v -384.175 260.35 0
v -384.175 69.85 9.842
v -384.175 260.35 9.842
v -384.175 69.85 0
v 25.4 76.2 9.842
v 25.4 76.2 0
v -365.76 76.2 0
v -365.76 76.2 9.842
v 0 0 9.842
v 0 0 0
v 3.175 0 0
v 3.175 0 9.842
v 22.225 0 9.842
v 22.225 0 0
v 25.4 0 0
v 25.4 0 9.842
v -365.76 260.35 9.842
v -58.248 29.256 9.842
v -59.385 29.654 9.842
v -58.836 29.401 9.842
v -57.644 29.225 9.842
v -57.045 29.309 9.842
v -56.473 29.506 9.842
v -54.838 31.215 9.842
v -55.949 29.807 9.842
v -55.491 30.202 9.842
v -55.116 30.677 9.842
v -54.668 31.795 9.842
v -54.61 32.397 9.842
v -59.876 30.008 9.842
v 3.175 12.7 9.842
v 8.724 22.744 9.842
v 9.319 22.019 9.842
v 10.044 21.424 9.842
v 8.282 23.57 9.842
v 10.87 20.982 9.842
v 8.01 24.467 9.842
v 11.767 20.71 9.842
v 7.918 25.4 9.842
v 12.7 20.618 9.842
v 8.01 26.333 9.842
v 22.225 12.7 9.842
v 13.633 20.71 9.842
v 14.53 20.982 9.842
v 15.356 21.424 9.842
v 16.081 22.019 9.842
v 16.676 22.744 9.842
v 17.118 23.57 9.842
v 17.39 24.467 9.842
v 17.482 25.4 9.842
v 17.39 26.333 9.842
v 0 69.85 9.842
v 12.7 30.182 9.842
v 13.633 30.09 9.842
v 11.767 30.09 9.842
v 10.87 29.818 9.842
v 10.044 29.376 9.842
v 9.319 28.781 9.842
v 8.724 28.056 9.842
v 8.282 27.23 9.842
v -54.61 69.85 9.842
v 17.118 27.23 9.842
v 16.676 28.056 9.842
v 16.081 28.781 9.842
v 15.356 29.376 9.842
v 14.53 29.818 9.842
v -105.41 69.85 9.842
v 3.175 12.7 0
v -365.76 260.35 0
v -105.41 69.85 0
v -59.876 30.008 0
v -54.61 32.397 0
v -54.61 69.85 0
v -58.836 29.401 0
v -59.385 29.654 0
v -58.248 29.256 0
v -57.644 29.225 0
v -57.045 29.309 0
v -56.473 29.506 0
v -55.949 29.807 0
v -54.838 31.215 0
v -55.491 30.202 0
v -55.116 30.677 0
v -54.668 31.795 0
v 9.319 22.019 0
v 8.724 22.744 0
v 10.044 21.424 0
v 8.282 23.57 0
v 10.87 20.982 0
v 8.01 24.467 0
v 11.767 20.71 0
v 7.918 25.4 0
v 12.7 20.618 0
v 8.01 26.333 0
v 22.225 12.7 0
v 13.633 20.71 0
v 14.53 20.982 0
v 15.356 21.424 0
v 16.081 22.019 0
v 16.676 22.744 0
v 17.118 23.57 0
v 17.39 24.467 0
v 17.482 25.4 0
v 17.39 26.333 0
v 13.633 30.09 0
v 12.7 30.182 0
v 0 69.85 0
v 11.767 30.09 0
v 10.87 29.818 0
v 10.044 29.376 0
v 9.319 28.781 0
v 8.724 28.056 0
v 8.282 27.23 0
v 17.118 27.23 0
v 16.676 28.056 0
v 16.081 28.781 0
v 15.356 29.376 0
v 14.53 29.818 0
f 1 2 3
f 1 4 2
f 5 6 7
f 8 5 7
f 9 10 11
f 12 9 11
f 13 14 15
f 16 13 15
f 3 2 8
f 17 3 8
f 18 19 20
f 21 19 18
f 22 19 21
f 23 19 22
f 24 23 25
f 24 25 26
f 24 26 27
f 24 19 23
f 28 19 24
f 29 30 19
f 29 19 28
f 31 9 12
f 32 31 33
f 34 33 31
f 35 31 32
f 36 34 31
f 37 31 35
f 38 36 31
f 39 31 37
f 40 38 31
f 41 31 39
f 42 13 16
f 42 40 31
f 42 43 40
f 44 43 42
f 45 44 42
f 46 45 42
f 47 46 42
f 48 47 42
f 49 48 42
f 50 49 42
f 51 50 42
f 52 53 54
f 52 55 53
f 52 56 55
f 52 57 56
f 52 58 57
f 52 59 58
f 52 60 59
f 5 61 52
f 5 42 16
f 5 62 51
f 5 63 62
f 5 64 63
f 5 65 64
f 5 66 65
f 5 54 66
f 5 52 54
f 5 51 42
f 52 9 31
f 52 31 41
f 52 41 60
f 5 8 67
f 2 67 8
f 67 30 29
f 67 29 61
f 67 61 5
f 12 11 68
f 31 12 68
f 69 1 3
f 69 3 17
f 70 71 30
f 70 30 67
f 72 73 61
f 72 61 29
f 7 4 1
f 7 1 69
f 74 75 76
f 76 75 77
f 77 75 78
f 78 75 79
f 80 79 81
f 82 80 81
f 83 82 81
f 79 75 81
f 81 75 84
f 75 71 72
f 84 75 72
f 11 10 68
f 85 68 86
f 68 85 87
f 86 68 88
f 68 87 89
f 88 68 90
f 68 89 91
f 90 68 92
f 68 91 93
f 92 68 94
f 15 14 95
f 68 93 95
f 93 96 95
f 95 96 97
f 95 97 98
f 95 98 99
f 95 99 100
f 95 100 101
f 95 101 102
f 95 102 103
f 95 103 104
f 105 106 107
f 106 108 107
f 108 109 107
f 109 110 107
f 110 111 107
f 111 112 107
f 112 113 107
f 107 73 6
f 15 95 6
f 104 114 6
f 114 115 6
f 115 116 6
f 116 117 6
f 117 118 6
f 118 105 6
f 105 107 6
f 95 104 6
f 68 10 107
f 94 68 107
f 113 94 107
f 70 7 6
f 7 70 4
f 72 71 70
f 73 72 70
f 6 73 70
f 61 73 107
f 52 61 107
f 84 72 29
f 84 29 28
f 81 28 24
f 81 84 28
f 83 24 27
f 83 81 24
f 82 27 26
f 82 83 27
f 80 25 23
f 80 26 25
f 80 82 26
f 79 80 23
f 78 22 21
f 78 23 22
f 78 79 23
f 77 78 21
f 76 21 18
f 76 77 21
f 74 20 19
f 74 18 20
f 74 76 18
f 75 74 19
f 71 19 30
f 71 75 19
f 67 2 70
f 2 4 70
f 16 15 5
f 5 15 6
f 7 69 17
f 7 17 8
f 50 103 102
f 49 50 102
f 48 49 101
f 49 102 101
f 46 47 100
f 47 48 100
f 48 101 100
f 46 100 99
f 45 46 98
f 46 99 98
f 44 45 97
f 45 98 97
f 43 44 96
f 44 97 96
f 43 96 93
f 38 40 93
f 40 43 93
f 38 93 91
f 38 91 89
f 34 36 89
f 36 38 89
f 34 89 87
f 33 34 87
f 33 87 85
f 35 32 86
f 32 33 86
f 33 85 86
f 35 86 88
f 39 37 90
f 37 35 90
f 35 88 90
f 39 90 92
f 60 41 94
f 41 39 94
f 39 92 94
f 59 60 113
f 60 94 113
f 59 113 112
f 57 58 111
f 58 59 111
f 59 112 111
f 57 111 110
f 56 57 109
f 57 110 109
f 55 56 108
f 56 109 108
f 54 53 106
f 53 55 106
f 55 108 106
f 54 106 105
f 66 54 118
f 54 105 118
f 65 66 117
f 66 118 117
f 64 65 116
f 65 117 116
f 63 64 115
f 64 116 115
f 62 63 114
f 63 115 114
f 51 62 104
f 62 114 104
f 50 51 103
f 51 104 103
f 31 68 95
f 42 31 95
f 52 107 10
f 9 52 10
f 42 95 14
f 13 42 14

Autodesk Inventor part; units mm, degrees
ref_plane "YZ Plane" through (0, 0, 0) normal (1, 0, 0) x (0, 1, 0)
ref_plane "XZ Plane" through (0, 0, 0) normal (0, 1, 0) x (-1, 0, 0)
ref_plane "XY Plane" through (0, 0, 0) normal (0, 0, 1) x (1, 0, 0)
sketch "Sketch1" plane through (0, 0, 0) normal (0, 0, 1) x (1, 0, 0)
  line L0 (0, 0) -> (3.175, 0)
  line L1 (3.175, 0) -> (3.175, 12.7)
  line L2 (3.175, 12.7) -> (22.225, 12.7)
  line L3 (22.225, 12.7) -> (22.225, 0)
  line L4 (22.225, 0) -> (25.4, 0)
  circle A0 centre (12.7, 25.4) radius 4.7815
  line L5 (25.4, 0) -> (25.4, 76.2)
  line L6 (25.4, 76.2) -> (-384.175, 76.2)
  line L7 (0, 69.85) -> (0, 0)
  line L8 (-54.61, 69.85) -> (-54.61, 32.397)
  line L9 (-59.8758, 30.0075) -> (-105.41, 69.85)
  ellipse E0 centre (-26.9408, 50.8) end of major axis (0, 50.8) minor radius 19.05
  arc A1 (-59.8758, 30.0075) -> (-54.61, 32.397) centre (-57.785, 32.397) ccw
  line L10 (-384.175, 69.85) -> (-105.41, 69.85)
  line L11 (-54.61, 69.85) -> (0, 69.85)
  line L12 (-384.175, 69.85) -> (-384.175, 260.35)
  line L13 (-384.175, 260.35) -> (-365.76, 260.35)
  line L14 (-365.76, 260.35) -> (-365.76, 76.2)
  point P0 (-54.61, 25.4)
  dimension "d15" = 26.9408
  dimension "d16" = 19.05
  dimension "d0" = 3.175
  dimension "d1" = 12.7
  dimension "d2" = 19.05
  dimension "d3" = 3.175
  dimension "d4" = 12.7
  dimension "d6" = 9.5631
  dimension "d7" = 12.7
  dimension "d8" = 76.2
  dimension "d9" = 409.575
  dimension "d10" = 6.35
  dimension "d11" = 384.175
  dimension "d13" = 50.8
  dimension "d14" = 54.61
  dimension "d17" = 44.45
  dimension "d18" = 3.175
  dimension "d21" = 190.5
  dimension "d22" = 18.415
  dimension "d24" = 9.525
  dimension "d25" = 184.15
extrude "Extrusion1" add sketch "Sketch1" along normal blind 9.8425 contours L7 L11 L8 A1 L9 L10 L12 L6 L5 L4 L3 L2 L1 L0 | L6 L12 L13 L14
properties part number "Left Climber Hook"
